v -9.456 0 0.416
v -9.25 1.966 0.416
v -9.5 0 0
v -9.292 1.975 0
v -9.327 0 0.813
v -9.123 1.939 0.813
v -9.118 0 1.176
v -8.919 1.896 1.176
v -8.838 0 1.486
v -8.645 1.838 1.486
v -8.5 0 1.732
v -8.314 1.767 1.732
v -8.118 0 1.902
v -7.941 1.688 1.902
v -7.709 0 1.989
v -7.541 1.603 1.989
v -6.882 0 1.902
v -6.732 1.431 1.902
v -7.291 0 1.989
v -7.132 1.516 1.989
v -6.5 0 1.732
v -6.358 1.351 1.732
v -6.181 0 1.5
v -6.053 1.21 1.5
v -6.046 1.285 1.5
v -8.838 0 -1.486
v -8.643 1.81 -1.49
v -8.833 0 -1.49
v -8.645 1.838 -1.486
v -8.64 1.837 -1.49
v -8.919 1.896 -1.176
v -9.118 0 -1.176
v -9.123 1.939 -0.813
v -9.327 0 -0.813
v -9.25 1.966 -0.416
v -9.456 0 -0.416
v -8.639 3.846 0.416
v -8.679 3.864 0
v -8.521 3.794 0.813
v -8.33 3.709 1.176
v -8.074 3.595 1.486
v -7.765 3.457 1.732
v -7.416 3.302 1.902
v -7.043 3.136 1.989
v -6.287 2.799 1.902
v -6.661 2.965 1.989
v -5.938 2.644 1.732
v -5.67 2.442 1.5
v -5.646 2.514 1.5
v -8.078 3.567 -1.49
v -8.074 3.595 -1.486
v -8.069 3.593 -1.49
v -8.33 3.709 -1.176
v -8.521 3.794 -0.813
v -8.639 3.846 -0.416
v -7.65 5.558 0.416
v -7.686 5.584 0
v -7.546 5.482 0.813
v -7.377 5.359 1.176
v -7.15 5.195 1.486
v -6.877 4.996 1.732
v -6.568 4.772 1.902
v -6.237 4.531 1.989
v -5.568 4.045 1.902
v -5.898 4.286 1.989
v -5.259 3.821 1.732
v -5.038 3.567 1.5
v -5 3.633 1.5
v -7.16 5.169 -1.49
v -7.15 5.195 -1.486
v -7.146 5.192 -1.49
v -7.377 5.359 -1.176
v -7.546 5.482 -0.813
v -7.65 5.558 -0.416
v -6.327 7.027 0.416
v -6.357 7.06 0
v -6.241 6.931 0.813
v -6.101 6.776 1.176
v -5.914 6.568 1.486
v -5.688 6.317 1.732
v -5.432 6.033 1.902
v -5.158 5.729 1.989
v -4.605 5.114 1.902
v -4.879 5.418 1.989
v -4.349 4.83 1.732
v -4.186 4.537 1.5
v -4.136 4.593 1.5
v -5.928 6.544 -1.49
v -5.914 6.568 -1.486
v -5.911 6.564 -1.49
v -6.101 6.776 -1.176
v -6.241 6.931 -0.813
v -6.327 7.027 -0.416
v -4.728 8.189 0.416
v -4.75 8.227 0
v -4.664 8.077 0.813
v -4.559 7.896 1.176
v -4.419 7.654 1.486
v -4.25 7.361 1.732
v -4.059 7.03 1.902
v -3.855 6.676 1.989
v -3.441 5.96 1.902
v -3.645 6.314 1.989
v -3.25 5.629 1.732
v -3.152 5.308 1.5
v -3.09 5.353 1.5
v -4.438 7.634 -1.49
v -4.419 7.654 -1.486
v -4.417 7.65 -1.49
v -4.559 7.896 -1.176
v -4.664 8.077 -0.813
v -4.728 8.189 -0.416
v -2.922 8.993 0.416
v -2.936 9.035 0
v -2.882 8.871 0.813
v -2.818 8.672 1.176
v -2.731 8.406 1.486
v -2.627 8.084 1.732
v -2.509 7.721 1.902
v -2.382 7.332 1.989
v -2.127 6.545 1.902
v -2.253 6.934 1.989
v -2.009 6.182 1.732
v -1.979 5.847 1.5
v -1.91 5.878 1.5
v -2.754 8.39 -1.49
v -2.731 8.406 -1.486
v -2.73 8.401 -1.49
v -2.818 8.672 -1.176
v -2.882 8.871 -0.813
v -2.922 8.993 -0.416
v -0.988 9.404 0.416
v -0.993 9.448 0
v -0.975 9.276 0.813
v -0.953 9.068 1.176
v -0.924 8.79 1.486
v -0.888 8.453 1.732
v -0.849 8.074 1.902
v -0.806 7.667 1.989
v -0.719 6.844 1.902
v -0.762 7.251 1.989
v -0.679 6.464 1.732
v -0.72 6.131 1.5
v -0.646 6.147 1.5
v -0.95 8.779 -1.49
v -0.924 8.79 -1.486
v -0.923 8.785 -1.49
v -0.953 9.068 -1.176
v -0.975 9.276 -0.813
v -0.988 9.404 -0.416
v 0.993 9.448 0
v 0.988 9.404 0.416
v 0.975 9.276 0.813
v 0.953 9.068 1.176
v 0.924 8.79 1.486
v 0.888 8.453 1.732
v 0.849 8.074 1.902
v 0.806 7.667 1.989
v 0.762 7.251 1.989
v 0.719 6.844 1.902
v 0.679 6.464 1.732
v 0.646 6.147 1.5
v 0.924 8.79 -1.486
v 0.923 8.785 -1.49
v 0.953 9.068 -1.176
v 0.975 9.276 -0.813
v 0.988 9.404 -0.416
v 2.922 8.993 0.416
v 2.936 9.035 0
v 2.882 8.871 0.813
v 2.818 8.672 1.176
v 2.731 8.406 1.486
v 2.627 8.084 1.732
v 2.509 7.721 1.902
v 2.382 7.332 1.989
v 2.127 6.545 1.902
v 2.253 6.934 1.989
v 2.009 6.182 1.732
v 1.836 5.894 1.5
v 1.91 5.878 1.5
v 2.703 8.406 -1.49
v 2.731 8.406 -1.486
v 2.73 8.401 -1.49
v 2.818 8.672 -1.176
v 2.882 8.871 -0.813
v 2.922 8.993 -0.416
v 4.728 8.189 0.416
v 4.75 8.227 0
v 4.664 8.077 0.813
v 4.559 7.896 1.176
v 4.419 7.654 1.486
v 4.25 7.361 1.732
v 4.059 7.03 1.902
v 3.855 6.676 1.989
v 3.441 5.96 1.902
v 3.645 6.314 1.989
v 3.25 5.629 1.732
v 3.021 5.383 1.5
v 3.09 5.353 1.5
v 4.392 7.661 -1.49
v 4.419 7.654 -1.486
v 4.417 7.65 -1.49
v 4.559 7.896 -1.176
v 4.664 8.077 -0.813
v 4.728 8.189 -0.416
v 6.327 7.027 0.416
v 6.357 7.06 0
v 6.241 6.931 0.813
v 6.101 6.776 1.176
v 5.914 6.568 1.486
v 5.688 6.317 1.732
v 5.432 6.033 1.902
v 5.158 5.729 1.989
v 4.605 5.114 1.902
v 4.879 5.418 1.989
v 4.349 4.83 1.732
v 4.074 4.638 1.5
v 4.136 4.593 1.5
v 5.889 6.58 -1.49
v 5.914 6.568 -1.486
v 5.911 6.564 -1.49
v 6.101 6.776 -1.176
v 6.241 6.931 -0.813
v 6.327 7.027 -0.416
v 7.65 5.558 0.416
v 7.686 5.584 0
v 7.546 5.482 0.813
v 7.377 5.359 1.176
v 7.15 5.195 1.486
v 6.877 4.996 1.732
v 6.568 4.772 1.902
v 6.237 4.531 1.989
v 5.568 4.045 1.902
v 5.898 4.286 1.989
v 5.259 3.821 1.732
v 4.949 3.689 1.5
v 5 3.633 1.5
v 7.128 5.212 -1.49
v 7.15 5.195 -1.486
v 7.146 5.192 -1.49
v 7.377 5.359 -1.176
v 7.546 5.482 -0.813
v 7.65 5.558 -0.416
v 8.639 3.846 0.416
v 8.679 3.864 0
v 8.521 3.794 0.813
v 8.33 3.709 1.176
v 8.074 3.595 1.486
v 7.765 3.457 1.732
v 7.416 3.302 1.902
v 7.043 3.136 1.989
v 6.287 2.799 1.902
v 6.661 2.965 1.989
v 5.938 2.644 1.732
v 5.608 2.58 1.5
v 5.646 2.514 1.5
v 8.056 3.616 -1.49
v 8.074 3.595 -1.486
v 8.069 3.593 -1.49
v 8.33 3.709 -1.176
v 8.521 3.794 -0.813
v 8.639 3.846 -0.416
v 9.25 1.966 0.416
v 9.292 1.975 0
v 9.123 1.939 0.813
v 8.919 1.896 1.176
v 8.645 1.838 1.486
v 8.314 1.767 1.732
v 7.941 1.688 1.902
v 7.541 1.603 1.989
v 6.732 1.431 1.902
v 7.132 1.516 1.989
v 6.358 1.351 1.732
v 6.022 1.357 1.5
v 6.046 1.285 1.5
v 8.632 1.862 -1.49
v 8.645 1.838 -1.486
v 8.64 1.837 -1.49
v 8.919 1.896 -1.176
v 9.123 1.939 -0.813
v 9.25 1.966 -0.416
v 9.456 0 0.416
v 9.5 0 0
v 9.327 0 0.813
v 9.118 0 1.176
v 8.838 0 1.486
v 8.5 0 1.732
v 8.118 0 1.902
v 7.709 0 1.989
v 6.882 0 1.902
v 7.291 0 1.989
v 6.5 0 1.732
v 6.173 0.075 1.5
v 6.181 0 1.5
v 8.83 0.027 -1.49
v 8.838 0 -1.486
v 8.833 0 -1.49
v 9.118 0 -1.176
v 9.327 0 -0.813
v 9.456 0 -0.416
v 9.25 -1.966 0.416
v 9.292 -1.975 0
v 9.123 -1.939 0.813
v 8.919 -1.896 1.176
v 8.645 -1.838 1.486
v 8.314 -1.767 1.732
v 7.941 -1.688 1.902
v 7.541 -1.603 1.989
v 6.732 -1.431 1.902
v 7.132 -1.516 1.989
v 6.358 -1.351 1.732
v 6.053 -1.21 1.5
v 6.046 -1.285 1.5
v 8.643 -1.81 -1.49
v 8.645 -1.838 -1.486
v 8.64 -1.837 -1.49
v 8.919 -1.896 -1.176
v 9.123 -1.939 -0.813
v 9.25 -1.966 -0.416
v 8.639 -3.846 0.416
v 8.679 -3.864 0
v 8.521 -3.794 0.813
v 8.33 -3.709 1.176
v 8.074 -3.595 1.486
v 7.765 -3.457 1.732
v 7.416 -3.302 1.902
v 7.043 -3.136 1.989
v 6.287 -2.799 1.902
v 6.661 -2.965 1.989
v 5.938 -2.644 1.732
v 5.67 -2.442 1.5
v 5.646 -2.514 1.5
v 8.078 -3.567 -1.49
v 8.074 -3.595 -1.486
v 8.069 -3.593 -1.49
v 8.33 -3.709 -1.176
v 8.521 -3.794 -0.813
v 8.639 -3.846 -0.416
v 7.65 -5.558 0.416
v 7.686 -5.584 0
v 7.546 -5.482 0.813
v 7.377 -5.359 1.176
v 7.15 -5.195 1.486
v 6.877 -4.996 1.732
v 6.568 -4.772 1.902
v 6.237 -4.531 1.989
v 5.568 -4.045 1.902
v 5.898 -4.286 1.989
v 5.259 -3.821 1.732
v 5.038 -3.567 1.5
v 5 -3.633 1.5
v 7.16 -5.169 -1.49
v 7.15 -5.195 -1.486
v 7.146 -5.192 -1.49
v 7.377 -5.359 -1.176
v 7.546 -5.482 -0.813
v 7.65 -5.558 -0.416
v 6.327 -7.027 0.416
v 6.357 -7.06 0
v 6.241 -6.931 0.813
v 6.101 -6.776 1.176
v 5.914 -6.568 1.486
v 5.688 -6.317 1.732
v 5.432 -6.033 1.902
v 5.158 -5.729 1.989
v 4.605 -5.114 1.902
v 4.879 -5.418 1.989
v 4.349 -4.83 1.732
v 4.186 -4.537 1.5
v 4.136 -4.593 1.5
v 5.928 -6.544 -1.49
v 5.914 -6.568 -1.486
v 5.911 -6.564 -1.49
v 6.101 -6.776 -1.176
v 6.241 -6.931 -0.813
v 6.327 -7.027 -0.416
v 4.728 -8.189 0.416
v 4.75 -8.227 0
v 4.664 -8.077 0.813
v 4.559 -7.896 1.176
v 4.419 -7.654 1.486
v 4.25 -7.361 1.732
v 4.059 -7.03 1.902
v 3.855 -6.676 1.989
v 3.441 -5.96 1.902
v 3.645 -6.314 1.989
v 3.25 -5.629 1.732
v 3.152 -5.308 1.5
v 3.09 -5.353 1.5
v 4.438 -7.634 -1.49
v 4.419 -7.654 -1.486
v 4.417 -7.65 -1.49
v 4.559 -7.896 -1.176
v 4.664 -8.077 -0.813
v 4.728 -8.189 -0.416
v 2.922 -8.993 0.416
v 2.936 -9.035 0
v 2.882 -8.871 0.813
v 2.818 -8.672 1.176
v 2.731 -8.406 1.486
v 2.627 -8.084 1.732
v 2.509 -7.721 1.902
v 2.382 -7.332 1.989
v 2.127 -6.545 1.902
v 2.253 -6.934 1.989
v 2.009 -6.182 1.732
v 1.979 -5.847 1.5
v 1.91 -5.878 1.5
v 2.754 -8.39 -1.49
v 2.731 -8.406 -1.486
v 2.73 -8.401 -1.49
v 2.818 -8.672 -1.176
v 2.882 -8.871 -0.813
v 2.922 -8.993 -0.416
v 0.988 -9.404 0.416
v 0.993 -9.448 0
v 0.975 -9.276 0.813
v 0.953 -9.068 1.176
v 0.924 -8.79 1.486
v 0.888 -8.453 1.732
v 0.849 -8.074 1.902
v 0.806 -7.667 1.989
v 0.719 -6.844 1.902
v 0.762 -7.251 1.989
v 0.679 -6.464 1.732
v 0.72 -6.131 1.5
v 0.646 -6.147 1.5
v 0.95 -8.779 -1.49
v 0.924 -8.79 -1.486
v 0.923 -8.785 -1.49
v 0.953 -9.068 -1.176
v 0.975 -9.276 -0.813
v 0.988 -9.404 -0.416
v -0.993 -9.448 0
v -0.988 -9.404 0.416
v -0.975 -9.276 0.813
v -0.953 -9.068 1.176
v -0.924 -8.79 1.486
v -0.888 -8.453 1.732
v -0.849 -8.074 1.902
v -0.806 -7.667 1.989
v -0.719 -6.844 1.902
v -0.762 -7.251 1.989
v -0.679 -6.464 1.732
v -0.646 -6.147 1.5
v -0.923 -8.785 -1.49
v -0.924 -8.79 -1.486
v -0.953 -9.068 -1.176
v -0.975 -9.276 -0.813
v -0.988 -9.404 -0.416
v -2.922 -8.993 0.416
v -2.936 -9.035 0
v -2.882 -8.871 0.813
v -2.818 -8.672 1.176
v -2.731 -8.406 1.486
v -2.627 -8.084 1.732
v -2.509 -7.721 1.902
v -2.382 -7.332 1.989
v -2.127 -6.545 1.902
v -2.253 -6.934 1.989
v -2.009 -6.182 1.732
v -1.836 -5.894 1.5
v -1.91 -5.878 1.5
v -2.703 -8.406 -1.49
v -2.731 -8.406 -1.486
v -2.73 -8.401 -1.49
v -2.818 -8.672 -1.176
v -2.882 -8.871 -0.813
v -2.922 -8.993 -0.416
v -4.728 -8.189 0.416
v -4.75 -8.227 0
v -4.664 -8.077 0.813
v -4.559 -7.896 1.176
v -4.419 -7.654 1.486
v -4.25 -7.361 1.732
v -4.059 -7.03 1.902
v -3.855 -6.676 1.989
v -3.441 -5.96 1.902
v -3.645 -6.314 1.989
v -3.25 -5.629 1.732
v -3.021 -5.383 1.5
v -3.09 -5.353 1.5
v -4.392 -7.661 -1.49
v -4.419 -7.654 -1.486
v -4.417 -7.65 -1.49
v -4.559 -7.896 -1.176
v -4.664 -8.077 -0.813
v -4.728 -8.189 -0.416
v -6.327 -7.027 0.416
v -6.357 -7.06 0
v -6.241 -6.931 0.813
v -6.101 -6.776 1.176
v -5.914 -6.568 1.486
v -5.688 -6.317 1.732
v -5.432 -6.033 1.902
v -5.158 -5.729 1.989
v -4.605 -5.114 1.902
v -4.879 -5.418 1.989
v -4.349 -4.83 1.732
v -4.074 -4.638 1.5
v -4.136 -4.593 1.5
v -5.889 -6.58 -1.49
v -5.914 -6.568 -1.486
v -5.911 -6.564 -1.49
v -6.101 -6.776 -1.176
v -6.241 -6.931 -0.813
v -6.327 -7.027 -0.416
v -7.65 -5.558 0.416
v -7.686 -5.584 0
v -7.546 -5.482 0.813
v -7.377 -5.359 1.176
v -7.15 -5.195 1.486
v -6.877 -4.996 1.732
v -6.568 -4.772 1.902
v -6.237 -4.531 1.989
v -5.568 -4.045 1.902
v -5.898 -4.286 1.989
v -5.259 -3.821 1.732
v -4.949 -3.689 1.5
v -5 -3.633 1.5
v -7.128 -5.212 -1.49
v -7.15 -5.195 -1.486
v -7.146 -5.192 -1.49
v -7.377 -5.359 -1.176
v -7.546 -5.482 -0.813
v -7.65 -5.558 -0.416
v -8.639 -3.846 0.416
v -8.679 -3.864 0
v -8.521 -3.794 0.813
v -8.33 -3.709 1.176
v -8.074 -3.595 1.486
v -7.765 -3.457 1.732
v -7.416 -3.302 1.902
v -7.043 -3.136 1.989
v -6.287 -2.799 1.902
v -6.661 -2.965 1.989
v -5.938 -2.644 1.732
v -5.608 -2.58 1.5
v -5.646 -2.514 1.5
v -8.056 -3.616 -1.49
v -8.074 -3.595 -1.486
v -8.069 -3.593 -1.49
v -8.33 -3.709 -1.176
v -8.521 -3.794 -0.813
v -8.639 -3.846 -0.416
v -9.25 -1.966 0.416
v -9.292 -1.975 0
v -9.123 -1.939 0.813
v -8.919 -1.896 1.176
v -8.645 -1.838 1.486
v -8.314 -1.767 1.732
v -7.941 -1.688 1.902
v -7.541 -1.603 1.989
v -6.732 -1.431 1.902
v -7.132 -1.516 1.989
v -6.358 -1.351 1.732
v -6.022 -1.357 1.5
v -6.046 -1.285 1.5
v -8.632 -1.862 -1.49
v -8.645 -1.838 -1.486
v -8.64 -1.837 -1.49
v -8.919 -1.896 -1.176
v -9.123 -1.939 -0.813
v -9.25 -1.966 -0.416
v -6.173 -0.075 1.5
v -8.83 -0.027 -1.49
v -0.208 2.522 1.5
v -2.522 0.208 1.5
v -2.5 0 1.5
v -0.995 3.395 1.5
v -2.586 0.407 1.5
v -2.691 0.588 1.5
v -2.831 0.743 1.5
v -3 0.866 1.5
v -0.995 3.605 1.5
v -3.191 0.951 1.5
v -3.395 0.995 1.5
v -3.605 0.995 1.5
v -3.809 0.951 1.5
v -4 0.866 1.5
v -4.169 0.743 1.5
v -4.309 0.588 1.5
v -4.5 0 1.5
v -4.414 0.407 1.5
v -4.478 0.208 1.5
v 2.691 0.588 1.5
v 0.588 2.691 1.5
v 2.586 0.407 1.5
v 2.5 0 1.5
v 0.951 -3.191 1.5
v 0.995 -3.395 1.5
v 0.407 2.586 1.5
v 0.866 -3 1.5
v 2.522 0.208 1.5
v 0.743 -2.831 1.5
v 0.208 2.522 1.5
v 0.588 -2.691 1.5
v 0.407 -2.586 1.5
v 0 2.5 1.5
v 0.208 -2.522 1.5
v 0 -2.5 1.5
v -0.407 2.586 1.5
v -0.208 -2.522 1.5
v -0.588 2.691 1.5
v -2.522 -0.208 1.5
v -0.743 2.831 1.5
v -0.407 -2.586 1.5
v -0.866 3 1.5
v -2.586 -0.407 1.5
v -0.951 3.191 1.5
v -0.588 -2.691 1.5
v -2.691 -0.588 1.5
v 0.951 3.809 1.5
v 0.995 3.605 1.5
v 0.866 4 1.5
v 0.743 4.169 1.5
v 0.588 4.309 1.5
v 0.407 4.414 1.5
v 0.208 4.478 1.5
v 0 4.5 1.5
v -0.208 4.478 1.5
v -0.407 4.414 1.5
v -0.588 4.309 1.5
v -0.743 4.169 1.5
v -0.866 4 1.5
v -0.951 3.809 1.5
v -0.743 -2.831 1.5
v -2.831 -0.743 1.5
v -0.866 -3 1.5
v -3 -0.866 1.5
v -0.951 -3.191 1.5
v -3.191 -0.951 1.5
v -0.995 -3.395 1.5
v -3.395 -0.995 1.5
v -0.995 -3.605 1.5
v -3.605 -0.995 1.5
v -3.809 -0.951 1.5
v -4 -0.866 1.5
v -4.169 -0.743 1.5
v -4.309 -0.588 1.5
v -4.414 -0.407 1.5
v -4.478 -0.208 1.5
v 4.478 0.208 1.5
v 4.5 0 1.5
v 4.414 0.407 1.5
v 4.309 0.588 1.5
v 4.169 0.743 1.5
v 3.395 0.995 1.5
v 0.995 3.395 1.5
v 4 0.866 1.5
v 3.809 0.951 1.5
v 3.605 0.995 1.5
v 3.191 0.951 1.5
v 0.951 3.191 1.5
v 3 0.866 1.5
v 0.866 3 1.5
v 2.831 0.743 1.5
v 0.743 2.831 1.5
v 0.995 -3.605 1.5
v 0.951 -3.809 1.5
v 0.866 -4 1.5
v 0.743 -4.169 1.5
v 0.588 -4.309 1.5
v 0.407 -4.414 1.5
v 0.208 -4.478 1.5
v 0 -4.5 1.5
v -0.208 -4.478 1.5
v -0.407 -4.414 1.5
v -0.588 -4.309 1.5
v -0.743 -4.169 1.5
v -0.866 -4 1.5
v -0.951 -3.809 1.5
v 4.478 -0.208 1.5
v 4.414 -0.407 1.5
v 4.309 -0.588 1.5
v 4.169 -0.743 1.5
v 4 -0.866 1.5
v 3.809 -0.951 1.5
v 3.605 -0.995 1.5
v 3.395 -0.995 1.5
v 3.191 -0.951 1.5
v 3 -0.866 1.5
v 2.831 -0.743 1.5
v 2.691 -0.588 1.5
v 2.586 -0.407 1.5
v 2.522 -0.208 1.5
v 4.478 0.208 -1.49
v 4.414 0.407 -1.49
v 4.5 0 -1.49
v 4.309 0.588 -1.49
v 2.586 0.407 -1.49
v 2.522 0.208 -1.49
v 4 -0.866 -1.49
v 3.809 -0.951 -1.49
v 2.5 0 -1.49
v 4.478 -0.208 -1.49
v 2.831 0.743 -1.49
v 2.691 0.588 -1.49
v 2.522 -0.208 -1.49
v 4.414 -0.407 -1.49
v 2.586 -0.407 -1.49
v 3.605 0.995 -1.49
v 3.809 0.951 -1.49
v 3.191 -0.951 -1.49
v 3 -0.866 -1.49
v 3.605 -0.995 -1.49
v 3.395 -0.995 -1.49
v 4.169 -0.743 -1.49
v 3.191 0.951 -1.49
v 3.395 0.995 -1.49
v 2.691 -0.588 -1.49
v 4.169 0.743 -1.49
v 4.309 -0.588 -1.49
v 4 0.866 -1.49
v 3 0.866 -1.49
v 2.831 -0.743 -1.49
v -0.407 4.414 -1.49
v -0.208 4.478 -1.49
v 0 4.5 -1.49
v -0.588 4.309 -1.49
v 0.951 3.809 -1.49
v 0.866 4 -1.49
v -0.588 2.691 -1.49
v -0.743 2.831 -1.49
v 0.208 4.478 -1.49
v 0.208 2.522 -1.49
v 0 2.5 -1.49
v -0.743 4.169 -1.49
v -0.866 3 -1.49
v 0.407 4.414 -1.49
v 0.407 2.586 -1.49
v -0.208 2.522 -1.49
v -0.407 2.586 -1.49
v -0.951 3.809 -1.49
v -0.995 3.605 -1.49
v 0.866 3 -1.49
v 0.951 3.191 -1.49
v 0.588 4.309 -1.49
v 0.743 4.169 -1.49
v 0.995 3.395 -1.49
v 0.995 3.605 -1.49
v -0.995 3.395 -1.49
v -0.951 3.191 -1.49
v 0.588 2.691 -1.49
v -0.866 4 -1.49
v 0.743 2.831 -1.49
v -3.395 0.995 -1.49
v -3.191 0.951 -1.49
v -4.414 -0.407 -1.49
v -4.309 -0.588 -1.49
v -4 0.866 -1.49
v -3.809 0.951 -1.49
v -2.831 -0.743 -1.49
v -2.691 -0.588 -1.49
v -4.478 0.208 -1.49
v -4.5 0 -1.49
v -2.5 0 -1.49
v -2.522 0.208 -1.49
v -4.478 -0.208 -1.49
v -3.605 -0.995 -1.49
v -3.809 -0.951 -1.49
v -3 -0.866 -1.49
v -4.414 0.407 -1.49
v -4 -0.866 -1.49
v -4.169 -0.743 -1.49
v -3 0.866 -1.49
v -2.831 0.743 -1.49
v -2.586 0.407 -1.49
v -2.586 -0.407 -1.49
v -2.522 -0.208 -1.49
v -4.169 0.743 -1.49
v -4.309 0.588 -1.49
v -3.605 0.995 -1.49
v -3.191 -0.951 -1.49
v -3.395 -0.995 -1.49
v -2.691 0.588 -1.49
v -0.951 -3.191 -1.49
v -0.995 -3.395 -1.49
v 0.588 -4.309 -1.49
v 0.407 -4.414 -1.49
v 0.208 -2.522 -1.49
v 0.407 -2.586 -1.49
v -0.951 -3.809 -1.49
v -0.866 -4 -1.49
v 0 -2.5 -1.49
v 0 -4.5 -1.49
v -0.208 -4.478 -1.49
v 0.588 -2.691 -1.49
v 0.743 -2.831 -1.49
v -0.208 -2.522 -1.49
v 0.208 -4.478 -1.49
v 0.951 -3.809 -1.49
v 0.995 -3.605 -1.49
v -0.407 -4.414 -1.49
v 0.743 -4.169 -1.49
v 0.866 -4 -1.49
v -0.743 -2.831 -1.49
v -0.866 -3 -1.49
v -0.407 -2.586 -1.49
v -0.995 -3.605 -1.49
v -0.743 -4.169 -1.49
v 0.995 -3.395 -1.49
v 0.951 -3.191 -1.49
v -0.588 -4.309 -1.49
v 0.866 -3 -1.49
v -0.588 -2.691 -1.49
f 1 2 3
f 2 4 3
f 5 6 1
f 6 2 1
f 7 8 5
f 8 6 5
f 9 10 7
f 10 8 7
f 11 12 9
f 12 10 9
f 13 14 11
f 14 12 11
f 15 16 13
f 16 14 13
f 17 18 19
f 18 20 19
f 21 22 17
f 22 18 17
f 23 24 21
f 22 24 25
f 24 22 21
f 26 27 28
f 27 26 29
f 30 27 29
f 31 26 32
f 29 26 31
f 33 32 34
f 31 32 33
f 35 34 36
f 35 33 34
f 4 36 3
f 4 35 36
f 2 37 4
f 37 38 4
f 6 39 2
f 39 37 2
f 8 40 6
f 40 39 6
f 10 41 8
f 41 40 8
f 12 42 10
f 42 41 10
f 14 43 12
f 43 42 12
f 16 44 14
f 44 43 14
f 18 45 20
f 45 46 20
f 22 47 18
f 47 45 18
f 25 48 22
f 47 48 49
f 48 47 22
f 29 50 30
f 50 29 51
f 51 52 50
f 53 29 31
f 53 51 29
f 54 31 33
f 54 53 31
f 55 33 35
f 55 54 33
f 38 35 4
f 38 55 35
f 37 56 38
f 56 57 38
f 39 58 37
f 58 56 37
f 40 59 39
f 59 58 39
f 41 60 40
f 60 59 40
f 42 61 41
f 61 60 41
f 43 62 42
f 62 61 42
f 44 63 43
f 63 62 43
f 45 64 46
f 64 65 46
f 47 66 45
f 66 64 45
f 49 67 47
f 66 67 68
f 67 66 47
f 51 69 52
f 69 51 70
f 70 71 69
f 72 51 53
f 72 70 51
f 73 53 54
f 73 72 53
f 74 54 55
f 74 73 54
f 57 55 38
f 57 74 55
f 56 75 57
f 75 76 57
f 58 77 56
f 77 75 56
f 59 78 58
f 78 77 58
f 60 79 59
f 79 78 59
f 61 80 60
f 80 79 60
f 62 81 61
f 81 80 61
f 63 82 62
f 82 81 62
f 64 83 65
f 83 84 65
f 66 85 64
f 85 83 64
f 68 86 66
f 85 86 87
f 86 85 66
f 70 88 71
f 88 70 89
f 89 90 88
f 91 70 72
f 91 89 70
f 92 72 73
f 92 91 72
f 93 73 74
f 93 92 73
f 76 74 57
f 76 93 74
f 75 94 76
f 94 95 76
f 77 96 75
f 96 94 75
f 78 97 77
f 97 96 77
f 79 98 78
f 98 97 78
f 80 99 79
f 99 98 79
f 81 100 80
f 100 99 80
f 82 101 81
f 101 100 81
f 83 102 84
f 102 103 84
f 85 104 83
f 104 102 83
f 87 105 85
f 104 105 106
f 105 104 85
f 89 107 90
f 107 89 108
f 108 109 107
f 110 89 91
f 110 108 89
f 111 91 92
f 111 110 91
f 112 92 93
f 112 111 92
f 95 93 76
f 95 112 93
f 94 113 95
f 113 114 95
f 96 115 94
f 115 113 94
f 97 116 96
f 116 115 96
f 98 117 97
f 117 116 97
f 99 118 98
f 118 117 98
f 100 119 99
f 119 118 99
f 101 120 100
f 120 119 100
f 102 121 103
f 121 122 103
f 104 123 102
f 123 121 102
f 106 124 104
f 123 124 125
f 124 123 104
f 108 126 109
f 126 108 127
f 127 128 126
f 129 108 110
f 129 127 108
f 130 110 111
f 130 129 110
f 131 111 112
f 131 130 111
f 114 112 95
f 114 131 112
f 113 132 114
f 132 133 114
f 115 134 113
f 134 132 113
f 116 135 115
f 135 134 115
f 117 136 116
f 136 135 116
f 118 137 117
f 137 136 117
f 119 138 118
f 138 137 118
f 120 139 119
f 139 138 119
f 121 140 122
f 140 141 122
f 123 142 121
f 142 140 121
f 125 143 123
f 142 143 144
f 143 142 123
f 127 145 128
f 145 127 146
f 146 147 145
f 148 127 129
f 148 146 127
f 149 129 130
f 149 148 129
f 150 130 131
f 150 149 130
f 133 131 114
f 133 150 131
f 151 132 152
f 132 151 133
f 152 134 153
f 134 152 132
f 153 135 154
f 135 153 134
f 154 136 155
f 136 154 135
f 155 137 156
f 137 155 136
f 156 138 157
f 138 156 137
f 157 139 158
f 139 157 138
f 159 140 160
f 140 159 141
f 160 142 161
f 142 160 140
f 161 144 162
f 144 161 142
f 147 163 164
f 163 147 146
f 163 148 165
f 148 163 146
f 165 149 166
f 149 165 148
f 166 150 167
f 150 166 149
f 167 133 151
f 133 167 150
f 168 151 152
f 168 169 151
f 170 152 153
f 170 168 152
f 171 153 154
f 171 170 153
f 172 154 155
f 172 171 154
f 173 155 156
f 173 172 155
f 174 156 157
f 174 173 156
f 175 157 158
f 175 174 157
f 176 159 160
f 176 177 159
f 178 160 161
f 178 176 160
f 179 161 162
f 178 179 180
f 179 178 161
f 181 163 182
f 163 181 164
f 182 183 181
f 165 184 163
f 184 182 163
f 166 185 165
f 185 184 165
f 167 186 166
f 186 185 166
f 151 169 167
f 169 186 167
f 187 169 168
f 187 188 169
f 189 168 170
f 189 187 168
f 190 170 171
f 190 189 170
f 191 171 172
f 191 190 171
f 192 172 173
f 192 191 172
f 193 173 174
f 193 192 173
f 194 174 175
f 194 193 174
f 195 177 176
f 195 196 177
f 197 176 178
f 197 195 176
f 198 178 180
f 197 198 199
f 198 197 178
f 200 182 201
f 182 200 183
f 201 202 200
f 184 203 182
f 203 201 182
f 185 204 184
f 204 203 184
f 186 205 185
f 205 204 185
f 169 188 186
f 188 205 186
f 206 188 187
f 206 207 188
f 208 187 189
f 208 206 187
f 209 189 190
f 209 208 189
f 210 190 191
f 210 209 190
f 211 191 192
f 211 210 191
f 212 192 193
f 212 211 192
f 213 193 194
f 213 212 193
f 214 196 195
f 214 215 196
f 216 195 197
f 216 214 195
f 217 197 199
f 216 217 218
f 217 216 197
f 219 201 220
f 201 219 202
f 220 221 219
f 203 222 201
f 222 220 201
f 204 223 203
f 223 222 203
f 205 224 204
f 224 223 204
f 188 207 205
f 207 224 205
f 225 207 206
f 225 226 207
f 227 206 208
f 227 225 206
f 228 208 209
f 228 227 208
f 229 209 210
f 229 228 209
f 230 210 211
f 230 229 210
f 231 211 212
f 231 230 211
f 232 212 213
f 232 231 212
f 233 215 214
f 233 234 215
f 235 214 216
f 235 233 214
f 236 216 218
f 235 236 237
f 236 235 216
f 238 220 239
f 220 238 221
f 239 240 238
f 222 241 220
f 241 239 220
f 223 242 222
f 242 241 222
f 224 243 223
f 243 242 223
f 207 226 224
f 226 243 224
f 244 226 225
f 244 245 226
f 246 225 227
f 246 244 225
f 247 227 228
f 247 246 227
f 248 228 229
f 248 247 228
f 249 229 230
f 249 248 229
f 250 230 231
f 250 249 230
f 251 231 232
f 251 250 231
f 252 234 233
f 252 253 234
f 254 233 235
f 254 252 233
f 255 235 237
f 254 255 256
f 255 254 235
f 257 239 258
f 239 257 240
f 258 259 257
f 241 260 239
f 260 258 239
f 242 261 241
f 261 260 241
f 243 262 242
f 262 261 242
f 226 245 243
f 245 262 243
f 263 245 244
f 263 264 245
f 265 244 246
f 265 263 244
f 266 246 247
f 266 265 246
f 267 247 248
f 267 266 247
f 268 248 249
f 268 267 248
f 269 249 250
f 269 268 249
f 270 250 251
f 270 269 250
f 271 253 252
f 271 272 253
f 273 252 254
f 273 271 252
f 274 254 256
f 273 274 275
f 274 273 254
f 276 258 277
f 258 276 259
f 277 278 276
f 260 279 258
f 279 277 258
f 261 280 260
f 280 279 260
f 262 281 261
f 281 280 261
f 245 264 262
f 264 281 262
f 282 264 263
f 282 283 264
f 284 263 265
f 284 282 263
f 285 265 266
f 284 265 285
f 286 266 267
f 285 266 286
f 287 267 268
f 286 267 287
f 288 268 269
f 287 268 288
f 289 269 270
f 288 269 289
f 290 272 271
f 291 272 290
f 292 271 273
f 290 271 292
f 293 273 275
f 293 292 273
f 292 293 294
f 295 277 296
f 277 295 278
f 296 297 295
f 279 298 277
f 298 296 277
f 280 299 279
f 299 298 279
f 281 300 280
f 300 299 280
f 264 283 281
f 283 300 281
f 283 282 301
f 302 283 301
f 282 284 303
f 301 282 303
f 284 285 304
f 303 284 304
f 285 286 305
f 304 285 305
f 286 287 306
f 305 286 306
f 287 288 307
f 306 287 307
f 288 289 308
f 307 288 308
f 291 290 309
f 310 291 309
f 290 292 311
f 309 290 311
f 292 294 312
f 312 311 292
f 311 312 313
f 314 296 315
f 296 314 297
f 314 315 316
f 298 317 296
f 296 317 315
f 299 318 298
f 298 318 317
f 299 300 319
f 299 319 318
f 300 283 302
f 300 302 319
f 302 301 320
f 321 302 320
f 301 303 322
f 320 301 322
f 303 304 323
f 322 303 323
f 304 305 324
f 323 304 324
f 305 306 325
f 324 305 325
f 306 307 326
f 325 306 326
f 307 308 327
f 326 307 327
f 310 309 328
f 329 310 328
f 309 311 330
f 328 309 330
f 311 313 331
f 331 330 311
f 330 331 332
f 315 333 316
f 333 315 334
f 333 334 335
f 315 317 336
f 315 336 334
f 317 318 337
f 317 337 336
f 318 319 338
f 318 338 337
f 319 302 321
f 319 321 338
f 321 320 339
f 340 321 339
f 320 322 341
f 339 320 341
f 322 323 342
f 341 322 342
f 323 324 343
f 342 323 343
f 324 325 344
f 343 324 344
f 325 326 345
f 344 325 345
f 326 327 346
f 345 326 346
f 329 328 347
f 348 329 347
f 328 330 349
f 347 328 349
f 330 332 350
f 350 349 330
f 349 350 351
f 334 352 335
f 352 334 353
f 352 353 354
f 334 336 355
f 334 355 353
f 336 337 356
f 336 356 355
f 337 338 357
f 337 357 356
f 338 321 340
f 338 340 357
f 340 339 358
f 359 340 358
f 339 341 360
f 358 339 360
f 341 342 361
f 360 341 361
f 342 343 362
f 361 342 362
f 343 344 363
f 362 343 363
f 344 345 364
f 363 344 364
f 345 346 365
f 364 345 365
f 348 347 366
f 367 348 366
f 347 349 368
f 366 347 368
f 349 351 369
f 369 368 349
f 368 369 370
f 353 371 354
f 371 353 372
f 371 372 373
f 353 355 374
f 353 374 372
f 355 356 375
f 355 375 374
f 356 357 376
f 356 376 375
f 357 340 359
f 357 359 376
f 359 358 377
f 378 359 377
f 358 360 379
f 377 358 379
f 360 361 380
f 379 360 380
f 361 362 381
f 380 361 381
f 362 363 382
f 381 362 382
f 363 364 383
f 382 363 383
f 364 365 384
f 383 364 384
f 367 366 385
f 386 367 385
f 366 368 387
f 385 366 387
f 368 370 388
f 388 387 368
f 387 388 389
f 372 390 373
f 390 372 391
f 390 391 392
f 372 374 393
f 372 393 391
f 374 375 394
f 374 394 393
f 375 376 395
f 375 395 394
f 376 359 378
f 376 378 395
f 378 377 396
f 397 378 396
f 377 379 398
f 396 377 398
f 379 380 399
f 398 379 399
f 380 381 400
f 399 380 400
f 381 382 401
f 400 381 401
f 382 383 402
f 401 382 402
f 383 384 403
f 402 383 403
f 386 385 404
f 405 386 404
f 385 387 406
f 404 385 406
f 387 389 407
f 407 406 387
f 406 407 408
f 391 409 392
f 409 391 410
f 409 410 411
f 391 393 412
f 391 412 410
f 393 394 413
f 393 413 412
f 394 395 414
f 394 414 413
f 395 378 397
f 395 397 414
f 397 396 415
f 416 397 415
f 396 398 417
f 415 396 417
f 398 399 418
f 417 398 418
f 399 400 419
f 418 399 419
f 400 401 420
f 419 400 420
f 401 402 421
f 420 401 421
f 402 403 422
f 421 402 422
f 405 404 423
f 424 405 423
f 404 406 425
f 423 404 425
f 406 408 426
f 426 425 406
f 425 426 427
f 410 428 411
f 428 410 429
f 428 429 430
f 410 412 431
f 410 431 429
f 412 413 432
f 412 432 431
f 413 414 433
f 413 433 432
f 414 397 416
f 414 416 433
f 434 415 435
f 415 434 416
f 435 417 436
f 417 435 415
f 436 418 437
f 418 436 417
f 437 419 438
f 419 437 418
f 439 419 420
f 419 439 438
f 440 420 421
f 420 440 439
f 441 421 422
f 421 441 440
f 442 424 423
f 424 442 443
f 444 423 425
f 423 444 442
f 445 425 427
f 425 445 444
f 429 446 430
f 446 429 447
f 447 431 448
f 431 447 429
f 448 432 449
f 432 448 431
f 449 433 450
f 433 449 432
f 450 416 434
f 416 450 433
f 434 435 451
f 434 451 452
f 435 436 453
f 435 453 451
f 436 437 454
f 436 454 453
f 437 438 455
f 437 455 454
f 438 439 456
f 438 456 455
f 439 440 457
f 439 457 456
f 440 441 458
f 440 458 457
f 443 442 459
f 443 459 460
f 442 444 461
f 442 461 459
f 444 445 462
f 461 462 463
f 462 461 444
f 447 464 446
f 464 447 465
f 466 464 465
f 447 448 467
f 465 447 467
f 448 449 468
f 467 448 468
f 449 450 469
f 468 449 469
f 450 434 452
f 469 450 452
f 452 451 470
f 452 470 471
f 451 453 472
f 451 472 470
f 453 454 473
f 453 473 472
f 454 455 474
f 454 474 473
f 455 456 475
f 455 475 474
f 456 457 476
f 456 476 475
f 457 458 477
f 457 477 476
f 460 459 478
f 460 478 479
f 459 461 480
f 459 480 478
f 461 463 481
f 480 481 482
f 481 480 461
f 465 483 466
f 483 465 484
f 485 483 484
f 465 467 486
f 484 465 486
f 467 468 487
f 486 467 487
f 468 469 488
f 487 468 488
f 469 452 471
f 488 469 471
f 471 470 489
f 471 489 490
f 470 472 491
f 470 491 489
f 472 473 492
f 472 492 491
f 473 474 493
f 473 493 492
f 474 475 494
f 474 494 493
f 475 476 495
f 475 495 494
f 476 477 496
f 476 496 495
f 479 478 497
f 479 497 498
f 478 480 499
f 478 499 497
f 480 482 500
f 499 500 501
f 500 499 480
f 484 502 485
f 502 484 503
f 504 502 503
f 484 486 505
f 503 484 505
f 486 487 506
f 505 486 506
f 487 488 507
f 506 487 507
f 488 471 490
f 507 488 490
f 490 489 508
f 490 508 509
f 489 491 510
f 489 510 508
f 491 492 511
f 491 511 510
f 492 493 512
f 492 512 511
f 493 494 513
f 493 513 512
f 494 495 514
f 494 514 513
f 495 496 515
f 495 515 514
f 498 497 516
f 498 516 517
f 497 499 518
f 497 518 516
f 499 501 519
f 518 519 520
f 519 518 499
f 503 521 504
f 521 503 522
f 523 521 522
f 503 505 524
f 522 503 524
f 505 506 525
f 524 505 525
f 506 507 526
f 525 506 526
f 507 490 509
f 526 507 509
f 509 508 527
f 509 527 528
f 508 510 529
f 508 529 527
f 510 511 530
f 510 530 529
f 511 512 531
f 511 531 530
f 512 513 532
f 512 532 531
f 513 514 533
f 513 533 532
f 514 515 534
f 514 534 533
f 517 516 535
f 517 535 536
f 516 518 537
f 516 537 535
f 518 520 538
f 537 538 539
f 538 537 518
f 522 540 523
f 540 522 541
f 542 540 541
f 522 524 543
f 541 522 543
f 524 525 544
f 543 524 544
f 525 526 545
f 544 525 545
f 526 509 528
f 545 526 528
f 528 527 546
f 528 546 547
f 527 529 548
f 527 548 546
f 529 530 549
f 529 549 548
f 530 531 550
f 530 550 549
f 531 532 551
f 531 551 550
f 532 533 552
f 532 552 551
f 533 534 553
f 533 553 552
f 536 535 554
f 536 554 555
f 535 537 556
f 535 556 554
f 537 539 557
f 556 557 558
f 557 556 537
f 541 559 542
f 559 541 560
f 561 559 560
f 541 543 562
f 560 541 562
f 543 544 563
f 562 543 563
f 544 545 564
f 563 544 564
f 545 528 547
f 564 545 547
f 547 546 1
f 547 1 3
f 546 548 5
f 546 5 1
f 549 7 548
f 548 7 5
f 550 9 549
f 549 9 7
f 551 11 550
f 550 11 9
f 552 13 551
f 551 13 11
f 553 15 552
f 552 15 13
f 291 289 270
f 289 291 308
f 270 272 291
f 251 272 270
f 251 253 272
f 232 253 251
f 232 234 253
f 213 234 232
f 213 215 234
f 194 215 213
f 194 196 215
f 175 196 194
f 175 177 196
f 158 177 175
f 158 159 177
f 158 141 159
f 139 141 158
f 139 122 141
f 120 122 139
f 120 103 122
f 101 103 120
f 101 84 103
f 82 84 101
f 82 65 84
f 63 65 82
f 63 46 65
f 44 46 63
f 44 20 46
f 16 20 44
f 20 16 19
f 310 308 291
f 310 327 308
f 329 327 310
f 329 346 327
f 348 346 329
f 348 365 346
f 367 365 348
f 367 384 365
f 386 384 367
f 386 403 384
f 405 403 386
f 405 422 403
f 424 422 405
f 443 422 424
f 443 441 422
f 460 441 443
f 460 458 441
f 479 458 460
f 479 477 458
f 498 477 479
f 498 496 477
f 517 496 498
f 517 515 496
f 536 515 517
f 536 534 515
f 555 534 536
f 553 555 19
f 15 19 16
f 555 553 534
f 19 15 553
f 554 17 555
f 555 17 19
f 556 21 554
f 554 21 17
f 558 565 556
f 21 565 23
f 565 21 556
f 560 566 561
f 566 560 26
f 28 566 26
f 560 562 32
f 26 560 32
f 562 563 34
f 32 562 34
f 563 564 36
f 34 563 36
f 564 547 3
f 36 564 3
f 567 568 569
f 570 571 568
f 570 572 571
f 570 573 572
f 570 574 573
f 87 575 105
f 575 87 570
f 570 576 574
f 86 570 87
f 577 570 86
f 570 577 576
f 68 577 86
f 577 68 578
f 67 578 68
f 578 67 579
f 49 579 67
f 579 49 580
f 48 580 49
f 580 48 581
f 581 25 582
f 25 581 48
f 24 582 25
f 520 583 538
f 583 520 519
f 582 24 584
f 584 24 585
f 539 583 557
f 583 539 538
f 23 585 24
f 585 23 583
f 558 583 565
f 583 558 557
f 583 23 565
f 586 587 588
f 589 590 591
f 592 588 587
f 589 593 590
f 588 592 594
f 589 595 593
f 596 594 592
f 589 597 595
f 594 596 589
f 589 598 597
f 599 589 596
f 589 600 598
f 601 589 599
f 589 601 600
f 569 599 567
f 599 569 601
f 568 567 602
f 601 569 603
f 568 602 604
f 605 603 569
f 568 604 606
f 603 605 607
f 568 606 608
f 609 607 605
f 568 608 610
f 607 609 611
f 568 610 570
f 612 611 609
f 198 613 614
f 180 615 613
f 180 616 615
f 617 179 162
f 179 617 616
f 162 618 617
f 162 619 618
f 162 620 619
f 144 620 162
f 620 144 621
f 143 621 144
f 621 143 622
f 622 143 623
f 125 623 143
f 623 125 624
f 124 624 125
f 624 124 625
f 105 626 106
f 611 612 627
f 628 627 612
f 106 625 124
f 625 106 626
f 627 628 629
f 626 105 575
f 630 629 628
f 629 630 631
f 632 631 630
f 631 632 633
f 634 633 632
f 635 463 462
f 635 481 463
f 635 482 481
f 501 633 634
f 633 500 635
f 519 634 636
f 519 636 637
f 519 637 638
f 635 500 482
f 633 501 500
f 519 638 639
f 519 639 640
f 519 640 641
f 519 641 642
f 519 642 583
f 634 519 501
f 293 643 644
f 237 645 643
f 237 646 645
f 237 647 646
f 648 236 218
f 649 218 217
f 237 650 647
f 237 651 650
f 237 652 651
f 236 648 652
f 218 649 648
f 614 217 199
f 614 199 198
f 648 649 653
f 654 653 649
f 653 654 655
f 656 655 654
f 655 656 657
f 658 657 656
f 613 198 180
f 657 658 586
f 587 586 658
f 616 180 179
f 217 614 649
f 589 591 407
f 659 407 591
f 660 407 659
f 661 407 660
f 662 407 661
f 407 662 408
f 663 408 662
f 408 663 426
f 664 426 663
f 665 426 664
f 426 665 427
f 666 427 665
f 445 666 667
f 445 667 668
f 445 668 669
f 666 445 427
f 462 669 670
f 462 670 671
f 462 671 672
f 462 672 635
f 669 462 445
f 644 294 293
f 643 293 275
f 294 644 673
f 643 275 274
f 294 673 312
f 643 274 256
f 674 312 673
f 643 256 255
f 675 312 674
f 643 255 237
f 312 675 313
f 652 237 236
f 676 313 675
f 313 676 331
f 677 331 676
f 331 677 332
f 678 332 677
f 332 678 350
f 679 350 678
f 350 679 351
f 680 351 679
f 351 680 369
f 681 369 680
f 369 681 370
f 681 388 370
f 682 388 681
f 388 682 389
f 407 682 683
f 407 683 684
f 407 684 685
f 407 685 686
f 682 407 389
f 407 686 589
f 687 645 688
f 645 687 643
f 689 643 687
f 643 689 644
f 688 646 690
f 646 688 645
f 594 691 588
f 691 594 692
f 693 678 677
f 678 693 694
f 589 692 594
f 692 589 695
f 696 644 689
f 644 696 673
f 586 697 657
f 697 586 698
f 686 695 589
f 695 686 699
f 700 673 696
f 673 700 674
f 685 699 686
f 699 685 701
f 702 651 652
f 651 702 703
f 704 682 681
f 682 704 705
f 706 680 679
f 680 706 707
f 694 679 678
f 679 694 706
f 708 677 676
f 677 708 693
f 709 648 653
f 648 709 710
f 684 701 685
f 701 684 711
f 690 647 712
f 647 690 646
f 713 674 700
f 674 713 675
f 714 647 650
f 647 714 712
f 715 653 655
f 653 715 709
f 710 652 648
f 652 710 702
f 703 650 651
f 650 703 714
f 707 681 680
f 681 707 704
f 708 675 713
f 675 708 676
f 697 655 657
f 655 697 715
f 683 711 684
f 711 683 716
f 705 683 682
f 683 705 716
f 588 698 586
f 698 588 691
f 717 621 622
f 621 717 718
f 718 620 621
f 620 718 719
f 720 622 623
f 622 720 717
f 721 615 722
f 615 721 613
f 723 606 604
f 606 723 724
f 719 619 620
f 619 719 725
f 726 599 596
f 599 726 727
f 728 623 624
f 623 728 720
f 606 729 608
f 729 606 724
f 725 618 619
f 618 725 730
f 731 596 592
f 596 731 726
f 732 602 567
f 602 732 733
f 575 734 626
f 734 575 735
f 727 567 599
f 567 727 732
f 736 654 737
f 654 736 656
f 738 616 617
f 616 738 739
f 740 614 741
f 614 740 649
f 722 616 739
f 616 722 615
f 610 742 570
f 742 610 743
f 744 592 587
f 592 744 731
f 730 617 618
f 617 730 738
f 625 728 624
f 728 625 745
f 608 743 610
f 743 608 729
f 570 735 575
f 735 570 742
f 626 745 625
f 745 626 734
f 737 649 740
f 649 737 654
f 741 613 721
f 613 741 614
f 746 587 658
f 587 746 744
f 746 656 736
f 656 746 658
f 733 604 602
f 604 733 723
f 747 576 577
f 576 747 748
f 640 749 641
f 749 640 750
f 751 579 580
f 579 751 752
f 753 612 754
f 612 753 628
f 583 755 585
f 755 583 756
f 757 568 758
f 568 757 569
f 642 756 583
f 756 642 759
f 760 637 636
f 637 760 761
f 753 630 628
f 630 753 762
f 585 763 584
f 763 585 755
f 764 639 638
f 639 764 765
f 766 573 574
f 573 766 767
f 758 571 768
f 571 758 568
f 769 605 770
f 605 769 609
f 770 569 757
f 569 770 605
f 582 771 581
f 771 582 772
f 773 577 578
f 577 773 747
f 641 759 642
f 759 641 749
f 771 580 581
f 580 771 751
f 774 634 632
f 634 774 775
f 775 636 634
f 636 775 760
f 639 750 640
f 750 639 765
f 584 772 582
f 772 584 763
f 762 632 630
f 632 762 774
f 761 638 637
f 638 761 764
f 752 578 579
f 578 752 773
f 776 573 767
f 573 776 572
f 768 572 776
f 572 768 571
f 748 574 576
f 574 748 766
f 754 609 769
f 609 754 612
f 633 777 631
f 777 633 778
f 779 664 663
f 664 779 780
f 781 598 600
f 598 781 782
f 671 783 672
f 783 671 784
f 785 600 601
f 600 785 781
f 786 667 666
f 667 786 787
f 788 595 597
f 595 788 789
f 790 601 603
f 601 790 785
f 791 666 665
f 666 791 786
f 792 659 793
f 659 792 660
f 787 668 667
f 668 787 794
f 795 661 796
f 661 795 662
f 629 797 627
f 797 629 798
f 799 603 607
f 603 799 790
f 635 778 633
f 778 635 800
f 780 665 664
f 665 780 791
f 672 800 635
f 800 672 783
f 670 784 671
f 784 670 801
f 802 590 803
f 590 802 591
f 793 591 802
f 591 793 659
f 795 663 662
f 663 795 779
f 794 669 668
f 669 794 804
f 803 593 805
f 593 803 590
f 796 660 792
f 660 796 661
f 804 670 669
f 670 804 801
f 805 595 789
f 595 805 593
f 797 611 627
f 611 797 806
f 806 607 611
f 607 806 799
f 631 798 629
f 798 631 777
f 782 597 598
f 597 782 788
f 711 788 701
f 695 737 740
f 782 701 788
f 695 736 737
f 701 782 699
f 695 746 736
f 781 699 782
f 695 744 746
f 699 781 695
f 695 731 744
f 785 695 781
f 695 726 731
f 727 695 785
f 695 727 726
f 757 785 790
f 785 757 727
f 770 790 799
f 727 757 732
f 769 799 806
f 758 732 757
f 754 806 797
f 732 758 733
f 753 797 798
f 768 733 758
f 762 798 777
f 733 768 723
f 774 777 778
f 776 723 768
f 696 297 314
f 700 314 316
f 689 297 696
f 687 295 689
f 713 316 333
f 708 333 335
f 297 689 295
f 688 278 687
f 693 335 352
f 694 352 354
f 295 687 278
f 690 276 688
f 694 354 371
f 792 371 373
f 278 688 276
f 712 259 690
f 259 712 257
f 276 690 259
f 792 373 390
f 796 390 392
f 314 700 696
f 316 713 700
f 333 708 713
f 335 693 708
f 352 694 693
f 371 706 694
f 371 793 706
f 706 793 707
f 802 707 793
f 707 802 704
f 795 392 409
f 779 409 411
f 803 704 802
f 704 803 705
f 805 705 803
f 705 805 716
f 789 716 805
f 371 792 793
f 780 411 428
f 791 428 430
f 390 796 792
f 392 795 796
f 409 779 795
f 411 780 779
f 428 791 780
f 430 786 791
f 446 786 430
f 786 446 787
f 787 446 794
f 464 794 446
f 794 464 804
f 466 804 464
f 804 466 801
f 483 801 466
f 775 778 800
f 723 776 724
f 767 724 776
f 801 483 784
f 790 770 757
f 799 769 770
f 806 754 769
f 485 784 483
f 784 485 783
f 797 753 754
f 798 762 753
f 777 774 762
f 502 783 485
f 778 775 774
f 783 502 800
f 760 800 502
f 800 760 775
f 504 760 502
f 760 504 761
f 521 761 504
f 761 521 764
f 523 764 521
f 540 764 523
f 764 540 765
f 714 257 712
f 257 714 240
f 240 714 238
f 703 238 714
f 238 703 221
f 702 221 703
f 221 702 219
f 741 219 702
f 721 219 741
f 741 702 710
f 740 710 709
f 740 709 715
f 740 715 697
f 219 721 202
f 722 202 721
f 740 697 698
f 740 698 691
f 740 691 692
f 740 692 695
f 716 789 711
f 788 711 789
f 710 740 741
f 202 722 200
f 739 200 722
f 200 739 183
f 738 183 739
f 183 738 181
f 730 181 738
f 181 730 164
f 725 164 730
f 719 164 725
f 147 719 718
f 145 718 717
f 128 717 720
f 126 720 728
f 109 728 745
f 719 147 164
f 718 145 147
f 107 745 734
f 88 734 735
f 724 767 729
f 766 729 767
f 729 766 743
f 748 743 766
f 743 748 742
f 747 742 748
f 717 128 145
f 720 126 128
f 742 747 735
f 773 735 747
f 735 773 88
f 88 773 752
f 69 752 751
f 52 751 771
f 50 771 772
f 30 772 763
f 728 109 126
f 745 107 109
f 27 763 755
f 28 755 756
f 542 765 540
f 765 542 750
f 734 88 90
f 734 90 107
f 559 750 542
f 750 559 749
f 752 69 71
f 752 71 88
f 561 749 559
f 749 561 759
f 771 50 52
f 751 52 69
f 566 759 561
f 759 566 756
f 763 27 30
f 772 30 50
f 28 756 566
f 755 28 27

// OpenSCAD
/* [Settings] */
// diameter of the button
OD = 15;
// how many sewing holes you want, set to 0 for none
numHoles = 4;
// thickness of button
thickness = 3;
// how far the holes are spaced from the center
holerRimOD = 7;
// size of sewing holes
holeOD = 2;
// size of outer fillet
rimRadius = 2;
// type of button cut
flatStat = "bottom"; // [top,bottom,both,none]


// calculations
holeOr = holeOD/2;
Or = OD/2;
holeRimOr = holerRimOD/2;

module button() {
	$fn = 30;
	difference() {
		union() {
			// fillet rims
			rotate_extrude() {
				translate([Or,0])
				circle(rimRadius,true);
			}
			// center cylinder
			cylinder(h = thickness, r = Or, center = true);
		}

		union() {
			// cutout hotes
			for (i = [0:numHoles]) {
				rotate([0,0,i*360/numHoles]) {
					translate([holeRimOr,0,0]) {
						cylinder(h = thickness*1.1, r = holeOr, center = true);
					}
				}
			}

			if (flatStat == "top") {
				translate([0,0,(rimRadius + thickness)/2 - 0.01])
				cylinder(h = rimRadius, r = OD*1.5, center = true);
			} else if (flatStat == "bottom") {
				translate([0,0,-(rimRadius + thickness)/2 + 0.01])
				cylinder(h = rimRadius, r = OD*1.5, center = true);
			} else if (flatStat == "both") {
				translate([0,0,(rimRadius + thickness)/2 - 0.01])
				cylinder(h = rimRadius, r = OD*1.5, center = true);

				translate([0,0,-(rimRadius + thickness)/2 + 0.01])
				cylinder(h = rimRadius, r = OD*1.5, center = true);
			}
		}
	}
}

button();
